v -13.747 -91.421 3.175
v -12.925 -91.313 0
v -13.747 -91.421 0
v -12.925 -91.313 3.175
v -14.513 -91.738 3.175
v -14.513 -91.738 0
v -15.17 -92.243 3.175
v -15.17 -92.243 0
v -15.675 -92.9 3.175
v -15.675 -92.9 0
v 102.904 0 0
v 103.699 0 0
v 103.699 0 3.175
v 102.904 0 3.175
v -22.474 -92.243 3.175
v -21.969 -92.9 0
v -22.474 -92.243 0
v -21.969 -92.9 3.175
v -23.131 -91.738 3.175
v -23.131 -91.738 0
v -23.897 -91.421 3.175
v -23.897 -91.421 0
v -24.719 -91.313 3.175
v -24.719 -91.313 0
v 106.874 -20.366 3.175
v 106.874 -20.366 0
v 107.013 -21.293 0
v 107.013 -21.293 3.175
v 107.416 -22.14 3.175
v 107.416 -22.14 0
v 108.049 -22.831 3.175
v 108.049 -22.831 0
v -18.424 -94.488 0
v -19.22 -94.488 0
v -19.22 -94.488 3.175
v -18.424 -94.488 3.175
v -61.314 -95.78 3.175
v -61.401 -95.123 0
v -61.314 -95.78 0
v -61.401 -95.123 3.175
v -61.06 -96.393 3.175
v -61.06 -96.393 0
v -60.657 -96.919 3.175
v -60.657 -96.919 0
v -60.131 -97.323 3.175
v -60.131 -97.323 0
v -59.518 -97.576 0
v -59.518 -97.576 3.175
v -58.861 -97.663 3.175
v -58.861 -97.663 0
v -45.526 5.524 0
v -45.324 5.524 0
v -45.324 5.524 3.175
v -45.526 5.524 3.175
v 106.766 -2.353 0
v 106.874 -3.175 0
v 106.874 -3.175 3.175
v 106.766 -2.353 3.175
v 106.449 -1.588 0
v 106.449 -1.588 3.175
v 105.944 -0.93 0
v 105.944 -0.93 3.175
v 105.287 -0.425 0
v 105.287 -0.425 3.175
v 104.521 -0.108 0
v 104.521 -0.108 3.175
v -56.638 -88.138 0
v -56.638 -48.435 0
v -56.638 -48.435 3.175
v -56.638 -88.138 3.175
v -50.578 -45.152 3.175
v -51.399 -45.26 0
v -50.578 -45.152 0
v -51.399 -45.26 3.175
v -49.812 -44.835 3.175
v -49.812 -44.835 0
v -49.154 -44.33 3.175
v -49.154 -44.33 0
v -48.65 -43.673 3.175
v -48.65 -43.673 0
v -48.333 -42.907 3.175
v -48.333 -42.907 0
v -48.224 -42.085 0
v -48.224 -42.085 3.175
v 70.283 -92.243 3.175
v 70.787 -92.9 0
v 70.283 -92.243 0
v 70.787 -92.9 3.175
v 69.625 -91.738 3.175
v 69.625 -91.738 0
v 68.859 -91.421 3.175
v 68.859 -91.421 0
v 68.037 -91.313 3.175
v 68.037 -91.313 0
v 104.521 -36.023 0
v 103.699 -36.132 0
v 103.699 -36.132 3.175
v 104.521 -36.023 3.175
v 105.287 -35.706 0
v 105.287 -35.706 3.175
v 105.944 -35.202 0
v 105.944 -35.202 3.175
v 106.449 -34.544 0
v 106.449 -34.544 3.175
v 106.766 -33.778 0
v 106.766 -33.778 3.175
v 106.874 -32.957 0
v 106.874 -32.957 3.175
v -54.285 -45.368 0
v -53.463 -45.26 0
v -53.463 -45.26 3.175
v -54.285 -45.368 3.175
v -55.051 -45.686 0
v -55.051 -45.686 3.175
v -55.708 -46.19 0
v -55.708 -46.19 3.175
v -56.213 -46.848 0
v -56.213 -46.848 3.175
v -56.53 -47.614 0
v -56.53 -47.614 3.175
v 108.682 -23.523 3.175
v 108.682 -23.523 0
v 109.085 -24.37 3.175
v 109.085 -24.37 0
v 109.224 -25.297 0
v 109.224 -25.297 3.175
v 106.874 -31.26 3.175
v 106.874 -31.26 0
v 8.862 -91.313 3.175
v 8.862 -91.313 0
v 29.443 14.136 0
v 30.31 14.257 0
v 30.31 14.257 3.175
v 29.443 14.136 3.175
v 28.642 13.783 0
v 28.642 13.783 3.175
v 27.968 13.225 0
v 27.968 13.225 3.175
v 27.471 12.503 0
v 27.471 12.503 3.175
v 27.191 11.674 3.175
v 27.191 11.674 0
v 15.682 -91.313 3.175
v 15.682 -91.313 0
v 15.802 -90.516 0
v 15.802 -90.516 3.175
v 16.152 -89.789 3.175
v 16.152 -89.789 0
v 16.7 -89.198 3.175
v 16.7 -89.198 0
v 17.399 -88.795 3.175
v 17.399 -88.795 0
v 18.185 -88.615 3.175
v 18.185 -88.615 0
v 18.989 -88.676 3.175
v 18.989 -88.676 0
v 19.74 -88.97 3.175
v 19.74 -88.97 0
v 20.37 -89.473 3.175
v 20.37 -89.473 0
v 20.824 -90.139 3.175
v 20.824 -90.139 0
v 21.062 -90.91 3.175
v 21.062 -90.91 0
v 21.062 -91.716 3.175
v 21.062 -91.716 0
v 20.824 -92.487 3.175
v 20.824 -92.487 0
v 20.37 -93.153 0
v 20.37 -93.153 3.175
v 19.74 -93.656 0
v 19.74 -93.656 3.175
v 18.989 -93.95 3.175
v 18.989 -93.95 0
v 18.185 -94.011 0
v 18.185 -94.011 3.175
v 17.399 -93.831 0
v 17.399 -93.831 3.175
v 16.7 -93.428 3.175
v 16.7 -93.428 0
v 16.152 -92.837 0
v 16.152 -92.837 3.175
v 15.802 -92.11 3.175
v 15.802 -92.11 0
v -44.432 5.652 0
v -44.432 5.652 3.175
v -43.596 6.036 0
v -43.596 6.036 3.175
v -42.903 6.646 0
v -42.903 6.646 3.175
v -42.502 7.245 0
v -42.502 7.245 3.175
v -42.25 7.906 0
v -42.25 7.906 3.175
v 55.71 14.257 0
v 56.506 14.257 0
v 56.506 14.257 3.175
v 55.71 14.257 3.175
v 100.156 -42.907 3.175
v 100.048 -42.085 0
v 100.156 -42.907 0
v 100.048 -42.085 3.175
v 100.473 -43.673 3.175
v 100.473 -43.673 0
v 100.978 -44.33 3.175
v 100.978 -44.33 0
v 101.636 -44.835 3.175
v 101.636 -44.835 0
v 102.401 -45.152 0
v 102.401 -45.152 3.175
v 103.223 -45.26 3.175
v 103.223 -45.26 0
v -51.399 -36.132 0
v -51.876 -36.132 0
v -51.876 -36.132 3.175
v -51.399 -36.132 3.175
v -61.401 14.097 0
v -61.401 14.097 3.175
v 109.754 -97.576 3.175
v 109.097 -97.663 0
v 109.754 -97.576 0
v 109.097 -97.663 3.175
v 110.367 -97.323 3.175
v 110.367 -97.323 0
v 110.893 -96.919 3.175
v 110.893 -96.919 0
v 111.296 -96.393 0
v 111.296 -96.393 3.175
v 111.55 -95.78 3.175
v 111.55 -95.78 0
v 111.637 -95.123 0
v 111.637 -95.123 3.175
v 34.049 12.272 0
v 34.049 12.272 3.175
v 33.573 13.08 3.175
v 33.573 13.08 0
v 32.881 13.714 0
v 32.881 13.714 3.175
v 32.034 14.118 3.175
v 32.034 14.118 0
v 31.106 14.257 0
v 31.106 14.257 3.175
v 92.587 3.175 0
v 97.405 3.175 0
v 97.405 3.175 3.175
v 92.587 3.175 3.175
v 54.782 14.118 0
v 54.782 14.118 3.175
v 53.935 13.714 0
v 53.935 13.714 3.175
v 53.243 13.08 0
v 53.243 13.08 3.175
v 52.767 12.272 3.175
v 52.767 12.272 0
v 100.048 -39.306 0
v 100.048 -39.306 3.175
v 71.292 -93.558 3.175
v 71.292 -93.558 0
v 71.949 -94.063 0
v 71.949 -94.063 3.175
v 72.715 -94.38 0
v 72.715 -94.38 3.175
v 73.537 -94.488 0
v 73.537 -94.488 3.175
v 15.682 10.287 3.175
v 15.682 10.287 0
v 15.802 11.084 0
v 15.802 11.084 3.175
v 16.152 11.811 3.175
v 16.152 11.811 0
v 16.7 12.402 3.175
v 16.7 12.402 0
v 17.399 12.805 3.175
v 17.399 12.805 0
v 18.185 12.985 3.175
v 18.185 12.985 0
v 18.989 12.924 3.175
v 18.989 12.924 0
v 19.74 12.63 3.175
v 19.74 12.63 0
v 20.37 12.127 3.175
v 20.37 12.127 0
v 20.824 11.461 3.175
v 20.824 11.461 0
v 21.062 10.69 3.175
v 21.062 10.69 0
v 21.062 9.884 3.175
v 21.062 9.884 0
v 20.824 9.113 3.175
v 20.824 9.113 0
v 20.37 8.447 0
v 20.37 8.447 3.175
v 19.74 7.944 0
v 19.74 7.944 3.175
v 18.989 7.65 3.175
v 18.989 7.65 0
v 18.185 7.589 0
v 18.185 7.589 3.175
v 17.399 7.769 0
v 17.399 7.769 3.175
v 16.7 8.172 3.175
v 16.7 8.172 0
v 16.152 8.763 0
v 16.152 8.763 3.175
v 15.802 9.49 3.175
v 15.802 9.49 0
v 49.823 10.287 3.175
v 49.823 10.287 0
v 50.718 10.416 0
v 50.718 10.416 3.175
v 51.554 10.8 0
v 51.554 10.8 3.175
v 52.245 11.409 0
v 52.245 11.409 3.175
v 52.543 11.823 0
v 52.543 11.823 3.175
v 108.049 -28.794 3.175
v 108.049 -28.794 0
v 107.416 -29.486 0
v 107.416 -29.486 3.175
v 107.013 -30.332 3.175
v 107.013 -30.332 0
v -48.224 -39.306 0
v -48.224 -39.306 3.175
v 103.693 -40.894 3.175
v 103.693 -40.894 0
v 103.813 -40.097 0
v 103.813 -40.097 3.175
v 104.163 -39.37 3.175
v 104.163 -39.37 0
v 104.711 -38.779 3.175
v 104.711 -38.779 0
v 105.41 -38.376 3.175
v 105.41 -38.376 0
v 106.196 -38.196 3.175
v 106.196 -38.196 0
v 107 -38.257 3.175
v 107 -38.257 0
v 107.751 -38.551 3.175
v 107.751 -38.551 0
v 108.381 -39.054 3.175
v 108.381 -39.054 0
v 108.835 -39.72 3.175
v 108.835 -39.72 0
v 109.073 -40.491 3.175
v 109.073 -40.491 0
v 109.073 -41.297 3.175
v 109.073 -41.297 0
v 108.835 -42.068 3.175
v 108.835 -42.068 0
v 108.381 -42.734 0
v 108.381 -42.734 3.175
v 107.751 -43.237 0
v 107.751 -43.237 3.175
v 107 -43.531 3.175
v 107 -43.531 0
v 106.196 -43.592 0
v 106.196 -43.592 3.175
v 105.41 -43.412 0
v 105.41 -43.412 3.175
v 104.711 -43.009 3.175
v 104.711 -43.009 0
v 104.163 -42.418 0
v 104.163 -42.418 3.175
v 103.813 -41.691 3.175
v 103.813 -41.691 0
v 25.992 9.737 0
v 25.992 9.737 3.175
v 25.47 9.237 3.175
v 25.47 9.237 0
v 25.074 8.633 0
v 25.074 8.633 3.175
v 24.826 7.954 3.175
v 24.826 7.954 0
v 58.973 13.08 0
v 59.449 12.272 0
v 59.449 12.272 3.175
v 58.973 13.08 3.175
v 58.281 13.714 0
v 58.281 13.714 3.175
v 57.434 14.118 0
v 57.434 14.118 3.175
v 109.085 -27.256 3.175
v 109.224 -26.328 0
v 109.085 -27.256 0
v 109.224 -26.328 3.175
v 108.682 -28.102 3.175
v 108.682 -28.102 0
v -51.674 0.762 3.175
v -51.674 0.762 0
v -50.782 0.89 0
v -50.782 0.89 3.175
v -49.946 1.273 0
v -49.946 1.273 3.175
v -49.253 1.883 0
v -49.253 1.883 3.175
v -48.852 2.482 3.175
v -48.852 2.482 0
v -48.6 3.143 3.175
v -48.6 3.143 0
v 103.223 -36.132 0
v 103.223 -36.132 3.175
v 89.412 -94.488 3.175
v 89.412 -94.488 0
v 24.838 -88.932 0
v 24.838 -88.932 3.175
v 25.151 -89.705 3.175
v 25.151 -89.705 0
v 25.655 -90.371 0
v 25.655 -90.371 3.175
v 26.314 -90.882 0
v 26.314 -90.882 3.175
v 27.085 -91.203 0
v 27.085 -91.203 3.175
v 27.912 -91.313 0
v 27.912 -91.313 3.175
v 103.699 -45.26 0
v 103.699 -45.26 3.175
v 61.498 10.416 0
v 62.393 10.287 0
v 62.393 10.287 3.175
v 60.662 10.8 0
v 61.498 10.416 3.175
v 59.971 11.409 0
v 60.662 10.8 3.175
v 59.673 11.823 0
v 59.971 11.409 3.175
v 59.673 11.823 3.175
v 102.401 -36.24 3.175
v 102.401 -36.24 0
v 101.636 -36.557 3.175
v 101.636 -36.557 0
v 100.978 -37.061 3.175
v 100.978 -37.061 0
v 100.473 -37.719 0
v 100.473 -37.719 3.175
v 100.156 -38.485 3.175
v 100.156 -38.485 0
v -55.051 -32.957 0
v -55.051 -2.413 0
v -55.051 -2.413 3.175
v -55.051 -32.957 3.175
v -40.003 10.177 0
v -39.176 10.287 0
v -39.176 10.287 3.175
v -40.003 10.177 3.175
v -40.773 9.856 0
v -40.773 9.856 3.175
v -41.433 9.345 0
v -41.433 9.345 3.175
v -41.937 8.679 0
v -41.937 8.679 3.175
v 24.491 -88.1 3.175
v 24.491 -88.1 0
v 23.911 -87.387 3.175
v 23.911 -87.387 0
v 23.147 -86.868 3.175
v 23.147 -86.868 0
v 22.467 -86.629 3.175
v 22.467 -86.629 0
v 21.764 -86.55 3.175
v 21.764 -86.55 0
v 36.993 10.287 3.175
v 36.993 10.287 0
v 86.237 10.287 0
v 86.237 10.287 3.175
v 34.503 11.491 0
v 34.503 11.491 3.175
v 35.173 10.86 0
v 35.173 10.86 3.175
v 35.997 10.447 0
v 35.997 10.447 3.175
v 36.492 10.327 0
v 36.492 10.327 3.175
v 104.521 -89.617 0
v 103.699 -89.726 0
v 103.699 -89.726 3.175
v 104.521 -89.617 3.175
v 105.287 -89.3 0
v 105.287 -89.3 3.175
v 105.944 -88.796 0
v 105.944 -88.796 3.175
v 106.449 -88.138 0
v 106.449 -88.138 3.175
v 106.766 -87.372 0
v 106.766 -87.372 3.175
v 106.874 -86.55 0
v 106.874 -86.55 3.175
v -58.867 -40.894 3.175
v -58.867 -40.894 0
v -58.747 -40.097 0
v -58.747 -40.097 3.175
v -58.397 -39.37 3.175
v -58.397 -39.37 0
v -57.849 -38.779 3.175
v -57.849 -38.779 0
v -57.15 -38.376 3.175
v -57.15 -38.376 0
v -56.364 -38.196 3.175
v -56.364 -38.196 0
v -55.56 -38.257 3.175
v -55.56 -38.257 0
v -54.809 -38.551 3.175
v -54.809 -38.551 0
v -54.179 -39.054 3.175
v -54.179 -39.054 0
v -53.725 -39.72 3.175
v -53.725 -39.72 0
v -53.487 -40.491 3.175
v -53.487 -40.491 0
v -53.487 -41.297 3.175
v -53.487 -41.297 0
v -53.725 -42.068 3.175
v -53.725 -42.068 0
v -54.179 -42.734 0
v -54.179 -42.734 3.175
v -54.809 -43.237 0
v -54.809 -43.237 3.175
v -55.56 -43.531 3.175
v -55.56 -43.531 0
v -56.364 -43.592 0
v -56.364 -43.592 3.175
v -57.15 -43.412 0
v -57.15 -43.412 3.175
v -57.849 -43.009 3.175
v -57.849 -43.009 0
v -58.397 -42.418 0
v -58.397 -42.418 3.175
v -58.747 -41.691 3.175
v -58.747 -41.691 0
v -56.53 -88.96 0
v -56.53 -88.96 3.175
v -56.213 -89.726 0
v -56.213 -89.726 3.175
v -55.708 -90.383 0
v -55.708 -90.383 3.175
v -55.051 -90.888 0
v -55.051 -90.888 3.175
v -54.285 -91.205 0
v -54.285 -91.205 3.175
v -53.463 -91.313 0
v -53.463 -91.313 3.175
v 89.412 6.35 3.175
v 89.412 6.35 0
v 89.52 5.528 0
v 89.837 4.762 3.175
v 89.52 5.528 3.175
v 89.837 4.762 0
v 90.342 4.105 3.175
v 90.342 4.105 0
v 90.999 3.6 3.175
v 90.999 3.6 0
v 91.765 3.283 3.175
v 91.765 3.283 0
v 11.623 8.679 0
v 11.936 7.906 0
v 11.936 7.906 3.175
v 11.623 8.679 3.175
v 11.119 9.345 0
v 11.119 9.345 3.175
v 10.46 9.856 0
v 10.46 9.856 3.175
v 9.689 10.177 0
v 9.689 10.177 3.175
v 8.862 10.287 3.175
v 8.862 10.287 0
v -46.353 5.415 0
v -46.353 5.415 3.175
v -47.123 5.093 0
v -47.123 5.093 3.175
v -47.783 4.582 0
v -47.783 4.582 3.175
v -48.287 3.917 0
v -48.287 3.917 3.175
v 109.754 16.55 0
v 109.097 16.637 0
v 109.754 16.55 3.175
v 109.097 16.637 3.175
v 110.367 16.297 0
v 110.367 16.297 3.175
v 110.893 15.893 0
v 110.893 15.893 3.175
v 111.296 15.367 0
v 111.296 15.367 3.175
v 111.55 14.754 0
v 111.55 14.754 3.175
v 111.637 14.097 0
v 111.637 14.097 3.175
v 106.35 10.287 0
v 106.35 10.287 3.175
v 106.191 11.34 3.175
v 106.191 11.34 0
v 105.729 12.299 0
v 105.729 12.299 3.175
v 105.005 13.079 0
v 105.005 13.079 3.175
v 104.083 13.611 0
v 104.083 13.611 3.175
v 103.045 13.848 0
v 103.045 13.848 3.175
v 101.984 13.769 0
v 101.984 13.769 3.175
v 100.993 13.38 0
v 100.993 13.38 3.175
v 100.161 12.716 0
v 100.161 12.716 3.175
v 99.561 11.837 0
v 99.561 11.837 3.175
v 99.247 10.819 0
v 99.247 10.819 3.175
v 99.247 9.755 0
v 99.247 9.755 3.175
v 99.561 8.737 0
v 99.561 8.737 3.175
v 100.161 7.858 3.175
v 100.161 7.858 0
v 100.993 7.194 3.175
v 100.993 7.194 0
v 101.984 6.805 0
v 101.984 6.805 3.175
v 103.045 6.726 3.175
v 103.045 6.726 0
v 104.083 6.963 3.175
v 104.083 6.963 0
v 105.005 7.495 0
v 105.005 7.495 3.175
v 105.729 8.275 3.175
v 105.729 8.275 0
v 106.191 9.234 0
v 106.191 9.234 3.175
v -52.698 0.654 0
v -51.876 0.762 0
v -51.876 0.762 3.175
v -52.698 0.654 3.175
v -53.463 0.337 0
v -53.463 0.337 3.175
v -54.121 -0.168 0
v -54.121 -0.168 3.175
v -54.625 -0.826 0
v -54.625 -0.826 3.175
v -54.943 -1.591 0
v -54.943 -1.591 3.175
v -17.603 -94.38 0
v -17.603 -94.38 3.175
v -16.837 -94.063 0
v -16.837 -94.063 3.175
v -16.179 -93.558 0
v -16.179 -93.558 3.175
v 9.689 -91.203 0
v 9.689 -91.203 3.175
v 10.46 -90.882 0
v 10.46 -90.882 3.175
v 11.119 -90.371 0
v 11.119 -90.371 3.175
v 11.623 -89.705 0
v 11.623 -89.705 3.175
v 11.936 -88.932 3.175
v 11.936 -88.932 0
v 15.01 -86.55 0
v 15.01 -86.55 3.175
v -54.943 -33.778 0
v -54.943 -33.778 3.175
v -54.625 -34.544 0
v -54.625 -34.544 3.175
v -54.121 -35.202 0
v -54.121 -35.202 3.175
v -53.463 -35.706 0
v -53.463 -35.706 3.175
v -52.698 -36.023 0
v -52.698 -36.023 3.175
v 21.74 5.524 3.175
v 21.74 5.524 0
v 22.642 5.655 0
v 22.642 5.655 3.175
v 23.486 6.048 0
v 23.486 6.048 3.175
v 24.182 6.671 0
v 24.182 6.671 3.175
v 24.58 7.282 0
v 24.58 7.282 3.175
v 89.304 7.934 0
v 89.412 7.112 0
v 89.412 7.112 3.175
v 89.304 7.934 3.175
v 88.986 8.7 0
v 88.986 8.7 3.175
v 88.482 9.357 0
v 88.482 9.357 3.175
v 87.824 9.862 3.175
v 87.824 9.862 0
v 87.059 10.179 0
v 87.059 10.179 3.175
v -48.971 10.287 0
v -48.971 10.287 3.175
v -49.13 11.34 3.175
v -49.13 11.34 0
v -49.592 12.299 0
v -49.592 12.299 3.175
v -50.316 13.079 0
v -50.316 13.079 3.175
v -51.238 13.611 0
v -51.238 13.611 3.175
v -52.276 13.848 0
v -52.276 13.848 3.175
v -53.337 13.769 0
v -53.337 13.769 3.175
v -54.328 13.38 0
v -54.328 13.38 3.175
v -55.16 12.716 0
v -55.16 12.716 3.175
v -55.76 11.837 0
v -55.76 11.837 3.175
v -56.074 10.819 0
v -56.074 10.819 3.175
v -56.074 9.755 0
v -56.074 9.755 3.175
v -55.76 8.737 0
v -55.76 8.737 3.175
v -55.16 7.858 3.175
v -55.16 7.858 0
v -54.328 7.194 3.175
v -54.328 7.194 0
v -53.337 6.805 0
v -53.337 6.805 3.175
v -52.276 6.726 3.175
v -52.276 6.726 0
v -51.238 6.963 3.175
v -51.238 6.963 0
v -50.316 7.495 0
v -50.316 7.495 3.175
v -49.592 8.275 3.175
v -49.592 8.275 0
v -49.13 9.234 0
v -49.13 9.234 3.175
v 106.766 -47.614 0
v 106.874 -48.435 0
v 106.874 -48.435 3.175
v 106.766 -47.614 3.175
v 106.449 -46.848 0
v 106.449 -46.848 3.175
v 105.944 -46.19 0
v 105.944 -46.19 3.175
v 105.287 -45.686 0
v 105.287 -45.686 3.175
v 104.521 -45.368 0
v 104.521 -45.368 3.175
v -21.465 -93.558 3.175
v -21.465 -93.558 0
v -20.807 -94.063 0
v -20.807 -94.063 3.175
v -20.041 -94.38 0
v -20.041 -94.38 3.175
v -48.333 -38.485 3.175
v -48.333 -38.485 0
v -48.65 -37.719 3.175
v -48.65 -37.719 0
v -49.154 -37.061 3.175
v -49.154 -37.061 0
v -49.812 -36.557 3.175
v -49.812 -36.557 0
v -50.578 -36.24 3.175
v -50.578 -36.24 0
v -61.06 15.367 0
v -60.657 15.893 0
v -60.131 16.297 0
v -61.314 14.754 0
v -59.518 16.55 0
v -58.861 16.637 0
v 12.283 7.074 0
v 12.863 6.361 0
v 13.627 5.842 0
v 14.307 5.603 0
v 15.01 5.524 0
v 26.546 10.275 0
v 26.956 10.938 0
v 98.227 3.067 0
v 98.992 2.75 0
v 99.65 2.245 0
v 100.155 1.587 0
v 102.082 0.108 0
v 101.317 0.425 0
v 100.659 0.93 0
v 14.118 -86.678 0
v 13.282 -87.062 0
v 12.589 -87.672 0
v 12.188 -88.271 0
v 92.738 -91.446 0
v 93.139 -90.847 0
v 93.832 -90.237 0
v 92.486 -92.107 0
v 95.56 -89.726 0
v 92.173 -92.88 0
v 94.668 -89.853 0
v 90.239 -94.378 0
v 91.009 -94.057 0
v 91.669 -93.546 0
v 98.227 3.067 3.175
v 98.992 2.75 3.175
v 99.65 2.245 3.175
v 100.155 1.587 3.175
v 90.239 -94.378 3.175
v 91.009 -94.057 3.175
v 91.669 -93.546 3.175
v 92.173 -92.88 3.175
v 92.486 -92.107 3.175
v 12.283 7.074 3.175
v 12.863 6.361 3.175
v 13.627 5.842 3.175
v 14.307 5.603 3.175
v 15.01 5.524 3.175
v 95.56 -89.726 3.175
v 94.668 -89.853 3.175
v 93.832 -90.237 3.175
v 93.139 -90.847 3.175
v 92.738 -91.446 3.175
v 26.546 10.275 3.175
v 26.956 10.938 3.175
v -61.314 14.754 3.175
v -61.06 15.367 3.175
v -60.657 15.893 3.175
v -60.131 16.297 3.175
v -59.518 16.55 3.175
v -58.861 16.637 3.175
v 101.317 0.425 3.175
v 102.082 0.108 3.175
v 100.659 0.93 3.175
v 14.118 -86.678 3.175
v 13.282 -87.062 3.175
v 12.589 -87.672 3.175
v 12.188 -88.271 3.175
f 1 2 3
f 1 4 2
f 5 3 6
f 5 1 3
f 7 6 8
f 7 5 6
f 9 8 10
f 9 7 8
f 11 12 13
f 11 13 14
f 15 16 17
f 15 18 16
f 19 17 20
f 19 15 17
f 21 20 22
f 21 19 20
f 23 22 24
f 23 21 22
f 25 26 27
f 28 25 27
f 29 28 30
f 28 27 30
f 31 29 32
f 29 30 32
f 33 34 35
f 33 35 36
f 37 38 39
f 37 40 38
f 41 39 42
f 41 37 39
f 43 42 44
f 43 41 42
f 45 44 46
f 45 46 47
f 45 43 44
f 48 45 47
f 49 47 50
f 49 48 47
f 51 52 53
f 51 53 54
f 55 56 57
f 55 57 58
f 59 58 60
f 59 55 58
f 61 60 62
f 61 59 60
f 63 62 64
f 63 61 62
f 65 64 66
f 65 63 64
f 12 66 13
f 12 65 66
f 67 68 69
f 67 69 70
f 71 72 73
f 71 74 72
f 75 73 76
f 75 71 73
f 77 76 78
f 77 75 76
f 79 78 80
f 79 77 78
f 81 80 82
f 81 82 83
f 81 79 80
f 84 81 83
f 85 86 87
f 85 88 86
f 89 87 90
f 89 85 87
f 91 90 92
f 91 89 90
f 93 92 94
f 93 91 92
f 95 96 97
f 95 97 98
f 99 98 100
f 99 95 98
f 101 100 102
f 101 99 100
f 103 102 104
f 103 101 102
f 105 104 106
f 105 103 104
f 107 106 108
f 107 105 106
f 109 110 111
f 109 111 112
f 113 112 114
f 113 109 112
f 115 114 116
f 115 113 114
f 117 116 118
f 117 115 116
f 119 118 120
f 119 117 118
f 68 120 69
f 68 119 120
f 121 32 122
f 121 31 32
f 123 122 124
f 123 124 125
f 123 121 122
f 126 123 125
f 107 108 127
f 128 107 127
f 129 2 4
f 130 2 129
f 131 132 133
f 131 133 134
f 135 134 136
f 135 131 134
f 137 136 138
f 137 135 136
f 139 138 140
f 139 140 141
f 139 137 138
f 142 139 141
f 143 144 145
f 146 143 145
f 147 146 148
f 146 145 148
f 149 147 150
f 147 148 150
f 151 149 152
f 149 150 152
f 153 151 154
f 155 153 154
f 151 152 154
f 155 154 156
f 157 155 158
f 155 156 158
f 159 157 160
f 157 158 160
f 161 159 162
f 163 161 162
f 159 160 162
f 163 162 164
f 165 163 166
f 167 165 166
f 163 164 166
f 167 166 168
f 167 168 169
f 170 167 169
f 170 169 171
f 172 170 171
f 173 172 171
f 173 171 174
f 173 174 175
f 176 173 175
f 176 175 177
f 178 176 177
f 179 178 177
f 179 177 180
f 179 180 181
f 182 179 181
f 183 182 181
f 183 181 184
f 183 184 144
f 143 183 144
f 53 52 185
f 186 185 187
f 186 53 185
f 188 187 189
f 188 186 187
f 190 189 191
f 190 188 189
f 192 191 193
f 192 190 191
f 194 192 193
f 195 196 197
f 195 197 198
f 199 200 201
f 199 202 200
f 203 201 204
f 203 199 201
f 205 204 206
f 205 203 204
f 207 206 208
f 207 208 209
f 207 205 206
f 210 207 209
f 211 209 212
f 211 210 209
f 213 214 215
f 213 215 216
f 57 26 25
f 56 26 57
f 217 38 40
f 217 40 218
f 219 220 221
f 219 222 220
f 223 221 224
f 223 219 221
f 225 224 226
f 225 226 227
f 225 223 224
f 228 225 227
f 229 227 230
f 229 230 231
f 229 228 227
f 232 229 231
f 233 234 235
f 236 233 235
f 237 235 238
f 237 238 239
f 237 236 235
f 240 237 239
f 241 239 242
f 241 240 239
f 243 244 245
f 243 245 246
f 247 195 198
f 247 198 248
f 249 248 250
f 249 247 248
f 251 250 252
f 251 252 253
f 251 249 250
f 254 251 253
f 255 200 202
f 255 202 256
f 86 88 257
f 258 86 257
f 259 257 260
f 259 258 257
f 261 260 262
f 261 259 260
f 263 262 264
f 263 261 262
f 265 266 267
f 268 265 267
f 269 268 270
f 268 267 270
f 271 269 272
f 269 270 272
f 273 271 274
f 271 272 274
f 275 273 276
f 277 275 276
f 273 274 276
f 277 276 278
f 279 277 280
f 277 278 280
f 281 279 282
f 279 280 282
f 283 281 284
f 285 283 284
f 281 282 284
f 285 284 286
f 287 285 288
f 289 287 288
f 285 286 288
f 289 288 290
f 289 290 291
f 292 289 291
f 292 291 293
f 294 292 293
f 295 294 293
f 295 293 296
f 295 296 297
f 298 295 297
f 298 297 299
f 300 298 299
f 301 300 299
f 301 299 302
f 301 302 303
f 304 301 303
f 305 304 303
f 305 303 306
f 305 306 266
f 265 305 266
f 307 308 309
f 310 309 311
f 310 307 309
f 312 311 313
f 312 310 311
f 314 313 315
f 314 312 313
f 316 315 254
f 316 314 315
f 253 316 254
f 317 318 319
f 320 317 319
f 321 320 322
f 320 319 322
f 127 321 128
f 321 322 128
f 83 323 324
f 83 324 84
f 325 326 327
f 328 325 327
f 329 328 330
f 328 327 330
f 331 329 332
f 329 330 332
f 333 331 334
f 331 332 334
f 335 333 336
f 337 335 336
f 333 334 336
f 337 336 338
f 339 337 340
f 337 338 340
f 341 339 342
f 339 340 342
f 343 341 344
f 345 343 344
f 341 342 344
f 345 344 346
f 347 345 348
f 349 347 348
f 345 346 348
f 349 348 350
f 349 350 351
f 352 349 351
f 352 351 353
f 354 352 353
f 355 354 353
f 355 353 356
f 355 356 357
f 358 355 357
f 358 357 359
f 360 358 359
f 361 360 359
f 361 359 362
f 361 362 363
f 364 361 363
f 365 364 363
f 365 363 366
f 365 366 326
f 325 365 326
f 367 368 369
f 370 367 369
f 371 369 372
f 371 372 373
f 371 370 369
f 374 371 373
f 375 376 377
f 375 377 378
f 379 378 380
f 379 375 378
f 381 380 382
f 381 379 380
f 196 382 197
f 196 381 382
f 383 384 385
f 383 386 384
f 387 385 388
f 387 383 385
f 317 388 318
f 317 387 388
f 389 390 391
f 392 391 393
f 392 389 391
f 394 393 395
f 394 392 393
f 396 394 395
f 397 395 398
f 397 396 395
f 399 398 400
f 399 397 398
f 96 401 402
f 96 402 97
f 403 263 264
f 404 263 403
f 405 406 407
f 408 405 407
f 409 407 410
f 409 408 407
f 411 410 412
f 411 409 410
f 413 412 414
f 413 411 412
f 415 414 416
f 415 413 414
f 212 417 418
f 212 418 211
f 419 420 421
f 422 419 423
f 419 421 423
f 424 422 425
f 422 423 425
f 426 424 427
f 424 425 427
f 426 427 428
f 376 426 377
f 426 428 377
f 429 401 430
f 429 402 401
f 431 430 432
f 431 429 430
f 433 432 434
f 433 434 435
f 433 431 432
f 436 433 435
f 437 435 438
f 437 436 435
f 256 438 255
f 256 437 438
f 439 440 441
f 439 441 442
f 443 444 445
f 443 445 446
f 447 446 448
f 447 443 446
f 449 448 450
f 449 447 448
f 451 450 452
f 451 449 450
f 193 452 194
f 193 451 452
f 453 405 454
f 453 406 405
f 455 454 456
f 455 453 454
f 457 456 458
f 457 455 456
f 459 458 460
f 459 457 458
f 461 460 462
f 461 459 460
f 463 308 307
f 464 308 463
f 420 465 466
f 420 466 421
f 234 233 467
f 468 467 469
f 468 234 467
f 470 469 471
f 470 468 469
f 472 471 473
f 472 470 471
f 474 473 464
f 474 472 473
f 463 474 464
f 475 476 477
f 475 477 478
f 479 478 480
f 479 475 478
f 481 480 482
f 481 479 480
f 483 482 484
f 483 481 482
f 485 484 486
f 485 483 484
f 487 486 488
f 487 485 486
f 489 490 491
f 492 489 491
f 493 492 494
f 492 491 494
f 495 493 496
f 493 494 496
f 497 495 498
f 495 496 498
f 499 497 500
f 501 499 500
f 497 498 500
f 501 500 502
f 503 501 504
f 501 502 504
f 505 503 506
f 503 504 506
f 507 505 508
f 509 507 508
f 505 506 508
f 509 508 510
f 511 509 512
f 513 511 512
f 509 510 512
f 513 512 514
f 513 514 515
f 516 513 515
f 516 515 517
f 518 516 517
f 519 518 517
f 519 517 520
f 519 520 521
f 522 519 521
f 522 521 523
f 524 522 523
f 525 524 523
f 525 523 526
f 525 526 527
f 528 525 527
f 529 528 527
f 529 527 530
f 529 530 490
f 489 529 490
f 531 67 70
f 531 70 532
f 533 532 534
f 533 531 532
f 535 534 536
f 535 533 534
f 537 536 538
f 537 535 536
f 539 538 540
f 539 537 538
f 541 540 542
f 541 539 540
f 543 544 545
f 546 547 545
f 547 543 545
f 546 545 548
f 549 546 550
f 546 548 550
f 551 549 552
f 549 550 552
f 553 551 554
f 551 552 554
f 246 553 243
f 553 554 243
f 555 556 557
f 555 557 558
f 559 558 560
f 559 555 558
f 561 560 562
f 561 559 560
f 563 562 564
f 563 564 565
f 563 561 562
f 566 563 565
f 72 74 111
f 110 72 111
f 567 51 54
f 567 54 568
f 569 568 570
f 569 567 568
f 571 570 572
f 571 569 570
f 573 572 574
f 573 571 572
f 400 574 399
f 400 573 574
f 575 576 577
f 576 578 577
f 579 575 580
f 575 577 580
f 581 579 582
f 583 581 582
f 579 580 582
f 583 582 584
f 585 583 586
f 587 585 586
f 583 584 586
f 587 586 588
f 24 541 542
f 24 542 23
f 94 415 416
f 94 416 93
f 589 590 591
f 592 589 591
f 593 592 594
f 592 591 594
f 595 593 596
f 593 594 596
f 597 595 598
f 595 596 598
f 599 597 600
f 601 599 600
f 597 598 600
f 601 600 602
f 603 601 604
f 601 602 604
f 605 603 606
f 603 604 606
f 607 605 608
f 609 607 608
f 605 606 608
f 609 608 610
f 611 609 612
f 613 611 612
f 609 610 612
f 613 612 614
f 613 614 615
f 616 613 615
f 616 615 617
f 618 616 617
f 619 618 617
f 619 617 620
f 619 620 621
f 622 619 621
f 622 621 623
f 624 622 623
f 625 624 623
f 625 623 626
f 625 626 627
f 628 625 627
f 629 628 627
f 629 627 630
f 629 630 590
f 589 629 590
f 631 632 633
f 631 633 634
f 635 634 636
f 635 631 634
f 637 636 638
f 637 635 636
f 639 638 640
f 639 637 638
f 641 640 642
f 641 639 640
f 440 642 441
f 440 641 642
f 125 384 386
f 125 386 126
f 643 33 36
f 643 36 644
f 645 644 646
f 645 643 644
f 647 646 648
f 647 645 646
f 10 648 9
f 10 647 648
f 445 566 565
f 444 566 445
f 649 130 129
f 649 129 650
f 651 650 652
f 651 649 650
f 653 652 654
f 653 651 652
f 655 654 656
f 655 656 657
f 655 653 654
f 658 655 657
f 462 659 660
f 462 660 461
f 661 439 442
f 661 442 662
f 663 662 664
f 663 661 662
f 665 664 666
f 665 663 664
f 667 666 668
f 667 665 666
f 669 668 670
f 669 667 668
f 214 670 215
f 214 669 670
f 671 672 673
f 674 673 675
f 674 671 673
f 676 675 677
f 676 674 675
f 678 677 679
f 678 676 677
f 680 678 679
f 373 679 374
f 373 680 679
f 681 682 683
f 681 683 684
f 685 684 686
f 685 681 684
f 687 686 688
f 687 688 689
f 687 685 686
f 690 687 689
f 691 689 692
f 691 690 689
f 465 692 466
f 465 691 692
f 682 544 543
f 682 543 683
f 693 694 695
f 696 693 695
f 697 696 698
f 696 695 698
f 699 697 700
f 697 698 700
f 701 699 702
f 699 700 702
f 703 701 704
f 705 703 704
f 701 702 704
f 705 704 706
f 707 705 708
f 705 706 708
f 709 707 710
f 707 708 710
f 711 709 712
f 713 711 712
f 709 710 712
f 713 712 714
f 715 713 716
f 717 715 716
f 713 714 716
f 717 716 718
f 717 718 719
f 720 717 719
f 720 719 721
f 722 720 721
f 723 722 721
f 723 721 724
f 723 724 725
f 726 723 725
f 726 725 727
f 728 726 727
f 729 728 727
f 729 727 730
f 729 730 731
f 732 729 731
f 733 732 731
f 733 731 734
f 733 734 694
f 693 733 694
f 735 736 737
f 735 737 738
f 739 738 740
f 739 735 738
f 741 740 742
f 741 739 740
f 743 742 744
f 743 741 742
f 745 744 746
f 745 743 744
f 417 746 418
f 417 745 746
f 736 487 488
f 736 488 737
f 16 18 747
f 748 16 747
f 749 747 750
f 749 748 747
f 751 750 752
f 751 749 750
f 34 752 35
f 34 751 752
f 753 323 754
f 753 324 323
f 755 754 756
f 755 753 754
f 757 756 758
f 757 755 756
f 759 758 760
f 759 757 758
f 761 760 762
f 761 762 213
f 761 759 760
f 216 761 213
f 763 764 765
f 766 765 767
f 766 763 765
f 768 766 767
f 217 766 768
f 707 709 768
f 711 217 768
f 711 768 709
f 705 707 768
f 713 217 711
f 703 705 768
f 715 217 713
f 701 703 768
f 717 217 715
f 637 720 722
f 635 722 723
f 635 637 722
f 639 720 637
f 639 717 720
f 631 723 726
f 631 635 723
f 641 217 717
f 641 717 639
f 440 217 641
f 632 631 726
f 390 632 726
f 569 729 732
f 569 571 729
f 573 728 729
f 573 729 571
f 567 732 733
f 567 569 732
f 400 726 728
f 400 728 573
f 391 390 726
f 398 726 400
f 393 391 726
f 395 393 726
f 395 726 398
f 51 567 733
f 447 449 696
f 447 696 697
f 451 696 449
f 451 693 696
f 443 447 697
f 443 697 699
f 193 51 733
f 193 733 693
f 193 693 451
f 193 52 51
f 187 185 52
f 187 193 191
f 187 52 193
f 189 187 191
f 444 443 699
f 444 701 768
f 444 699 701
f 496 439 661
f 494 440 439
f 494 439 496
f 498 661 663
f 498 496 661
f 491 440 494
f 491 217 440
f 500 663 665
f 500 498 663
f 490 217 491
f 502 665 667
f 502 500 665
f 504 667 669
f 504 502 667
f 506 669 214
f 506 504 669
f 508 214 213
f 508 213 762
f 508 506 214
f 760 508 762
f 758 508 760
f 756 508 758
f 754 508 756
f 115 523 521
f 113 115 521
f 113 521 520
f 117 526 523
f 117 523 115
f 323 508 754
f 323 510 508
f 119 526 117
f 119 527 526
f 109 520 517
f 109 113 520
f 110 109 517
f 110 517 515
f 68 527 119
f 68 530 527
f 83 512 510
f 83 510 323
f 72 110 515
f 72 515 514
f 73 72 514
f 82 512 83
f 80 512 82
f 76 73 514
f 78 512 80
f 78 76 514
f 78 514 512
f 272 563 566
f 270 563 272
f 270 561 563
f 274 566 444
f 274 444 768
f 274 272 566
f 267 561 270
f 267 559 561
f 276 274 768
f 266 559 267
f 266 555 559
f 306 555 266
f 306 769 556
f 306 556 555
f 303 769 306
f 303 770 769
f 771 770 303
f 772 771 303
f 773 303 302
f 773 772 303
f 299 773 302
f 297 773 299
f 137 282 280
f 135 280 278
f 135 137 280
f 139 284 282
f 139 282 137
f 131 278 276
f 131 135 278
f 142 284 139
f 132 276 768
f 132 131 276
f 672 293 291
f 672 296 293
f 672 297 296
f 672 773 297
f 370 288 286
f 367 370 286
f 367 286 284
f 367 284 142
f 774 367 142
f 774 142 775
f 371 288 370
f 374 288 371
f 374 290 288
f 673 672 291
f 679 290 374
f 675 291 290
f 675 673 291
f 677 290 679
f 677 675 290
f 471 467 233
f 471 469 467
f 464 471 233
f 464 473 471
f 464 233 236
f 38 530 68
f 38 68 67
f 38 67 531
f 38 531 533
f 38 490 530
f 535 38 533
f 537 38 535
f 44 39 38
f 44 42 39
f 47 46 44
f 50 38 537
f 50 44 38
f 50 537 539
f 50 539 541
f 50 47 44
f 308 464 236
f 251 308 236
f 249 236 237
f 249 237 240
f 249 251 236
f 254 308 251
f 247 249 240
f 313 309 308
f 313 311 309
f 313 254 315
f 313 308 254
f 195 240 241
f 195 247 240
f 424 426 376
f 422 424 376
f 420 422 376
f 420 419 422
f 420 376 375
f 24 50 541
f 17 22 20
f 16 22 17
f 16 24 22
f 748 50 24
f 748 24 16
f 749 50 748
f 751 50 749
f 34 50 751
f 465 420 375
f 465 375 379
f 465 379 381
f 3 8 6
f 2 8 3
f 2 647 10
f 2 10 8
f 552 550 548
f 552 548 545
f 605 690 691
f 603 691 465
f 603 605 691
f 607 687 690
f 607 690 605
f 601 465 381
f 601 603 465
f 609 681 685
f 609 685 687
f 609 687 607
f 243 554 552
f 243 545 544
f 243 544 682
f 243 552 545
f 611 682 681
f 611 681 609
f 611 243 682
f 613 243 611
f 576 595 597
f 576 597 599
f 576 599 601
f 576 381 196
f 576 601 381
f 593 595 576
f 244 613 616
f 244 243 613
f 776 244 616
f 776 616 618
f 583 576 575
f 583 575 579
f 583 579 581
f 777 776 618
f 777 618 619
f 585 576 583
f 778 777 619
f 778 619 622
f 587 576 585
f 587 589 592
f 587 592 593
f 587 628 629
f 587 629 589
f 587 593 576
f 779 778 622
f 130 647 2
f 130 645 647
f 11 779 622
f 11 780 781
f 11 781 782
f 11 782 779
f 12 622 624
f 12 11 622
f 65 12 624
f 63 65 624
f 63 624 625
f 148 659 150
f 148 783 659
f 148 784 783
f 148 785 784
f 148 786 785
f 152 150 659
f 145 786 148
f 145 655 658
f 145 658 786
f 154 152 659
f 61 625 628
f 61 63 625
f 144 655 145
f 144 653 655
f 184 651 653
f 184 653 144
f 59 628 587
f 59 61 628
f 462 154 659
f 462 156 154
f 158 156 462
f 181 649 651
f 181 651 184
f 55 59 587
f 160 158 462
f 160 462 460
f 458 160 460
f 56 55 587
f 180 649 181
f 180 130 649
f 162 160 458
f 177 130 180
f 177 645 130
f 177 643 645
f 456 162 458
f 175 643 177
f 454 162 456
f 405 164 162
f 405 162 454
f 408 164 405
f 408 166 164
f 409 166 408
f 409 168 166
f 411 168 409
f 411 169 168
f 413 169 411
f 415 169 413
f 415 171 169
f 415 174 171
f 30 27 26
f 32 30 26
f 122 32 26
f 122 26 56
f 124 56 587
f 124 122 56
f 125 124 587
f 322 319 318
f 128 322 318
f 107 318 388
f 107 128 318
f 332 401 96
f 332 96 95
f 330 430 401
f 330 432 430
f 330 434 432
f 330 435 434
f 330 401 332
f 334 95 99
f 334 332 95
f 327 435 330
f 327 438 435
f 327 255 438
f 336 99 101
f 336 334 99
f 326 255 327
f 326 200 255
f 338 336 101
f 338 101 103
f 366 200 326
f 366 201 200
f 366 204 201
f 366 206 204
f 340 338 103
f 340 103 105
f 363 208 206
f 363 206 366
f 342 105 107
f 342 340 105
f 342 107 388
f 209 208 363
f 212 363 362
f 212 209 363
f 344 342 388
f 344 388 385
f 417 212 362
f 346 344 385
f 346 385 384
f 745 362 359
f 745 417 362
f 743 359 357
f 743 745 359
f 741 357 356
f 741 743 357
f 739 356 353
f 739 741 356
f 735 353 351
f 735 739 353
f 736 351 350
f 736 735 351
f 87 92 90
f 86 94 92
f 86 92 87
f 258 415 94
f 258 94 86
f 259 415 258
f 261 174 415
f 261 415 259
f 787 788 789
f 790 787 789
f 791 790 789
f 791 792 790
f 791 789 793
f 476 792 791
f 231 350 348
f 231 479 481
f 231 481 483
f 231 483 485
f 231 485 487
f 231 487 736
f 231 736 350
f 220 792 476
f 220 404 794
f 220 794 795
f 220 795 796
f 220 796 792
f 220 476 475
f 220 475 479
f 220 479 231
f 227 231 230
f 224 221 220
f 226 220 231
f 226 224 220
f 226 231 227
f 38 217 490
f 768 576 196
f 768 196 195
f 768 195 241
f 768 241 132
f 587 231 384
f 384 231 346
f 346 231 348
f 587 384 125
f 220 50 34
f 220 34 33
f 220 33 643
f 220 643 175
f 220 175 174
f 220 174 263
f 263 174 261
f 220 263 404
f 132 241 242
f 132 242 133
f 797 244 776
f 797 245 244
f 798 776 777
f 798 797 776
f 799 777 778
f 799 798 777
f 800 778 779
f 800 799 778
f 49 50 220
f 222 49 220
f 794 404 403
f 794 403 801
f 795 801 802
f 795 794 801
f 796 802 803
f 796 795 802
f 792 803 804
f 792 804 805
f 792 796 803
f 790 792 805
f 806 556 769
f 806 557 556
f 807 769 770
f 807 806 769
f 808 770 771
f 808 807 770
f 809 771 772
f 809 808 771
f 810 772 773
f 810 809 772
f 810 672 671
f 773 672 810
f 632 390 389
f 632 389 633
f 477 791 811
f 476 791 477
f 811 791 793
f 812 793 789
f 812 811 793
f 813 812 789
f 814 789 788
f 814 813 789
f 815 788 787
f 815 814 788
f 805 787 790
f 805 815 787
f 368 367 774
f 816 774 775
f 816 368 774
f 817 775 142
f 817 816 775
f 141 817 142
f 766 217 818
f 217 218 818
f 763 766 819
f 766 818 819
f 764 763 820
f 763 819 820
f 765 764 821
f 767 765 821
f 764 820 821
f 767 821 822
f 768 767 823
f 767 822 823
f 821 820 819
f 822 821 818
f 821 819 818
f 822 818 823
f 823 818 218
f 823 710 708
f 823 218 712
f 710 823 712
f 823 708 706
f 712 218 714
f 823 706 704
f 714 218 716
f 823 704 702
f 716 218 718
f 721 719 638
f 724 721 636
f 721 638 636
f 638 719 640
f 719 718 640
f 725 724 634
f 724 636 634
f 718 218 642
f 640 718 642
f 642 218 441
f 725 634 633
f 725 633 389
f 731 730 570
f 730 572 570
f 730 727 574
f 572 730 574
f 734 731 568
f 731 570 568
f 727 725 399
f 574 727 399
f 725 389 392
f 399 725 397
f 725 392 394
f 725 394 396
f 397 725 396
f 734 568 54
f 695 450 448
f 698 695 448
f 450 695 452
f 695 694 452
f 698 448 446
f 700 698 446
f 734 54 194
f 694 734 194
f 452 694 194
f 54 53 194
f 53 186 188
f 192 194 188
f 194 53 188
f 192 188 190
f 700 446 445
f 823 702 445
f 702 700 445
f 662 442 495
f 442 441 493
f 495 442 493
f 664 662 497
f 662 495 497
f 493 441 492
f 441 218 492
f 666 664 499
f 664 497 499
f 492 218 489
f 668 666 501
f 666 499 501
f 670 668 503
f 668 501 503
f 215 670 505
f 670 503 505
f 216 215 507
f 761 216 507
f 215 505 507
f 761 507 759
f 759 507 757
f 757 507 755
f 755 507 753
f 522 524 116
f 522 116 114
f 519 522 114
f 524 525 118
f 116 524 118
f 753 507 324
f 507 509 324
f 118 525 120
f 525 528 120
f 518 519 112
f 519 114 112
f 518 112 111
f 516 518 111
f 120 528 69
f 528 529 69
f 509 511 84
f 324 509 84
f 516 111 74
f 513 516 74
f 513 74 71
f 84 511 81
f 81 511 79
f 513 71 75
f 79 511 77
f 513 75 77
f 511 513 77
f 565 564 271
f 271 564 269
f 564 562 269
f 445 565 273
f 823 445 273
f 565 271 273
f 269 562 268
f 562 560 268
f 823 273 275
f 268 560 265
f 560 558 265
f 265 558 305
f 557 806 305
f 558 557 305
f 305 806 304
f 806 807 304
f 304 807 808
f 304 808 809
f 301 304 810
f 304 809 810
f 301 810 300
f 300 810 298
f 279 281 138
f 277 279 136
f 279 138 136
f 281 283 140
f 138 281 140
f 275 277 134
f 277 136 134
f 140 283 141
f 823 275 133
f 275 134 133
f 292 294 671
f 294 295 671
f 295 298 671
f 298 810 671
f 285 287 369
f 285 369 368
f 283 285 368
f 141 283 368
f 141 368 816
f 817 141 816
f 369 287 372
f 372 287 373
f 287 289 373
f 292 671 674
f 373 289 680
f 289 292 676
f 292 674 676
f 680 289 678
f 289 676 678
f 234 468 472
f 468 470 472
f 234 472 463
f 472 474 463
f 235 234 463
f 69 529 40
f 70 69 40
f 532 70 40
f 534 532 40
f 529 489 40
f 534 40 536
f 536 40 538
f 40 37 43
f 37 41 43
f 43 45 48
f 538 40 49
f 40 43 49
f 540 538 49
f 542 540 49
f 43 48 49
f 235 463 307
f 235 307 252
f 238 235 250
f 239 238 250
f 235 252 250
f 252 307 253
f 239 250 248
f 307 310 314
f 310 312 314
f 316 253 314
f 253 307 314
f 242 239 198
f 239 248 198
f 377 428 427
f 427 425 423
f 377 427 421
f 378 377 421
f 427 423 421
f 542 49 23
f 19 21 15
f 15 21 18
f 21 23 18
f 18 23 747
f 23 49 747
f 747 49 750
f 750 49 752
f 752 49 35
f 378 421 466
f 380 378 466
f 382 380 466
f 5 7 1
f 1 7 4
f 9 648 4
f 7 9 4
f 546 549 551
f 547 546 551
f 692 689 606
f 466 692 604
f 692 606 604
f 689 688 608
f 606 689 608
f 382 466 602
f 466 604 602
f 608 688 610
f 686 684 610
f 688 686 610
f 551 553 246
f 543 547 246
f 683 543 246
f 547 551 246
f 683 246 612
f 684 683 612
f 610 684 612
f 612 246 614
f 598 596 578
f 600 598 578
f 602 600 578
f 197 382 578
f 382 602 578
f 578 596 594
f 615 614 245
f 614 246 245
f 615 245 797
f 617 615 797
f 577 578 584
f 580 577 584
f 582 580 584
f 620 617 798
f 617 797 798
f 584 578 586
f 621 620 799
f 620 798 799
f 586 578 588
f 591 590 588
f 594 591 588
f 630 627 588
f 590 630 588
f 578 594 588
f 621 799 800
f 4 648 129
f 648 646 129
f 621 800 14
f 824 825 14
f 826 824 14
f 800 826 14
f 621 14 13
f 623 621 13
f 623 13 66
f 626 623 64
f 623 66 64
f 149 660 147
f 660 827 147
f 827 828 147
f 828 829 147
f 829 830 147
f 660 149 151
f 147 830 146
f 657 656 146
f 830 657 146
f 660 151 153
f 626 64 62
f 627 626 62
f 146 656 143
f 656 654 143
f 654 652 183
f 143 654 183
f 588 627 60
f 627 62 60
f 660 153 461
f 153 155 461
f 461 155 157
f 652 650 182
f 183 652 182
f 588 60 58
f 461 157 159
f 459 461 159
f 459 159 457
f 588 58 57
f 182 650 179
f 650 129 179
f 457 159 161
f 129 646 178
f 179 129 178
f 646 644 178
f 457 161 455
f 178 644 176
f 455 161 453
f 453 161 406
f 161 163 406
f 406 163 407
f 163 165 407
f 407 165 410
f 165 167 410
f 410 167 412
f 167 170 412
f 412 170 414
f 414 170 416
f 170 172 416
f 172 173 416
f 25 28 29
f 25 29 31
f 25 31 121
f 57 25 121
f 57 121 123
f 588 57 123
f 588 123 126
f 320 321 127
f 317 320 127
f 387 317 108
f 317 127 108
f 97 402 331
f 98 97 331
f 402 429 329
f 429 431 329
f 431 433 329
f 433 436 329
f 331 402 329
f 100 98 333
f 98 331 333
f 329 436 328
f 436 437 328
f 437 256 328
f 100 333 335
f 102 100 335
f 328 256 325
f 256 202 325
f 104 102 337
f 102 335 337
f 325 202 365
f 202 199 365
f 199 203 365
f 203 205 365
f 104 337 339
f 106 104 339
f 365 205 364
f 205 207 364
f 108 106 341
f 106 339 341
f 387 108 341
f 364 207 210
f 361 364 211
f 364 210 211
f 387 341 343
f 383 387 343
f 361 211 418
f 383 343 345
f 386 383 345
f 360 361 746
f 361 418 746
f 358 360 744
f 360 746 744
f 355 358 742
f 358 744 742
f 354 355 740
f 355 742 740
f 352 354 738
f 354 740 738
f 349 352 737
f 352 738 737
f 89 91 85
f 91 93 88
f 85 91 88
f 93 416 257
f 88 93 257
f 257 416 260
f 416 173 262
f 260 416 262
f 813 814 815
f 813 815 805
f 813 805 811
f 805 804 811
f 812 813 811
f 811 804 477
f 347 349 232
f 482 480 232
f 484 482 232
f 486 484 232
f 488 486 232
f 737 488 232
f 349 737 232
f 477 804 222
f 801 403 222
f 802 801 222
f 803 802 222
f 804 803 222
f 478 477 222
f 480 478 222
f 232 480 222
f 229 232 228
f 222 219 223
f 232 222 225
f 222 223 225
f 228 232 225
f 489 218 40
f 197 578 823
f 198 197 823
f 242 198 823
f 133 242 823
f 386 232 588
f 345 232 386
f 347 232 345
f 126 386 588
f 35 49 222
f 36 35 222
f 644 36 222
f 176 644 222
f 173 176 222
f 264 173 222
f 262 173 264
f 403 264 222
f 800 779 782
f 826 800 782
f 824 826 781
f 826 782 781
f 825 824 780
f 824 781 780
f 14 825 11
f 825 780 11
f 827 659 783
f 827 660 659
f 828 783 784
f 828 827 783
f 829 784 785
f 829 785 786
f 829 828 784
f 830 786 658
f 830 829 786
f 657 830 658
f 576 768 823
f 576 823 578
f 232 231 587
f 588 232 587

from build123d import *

# Parameters (mm, degrees)
SKETCH1_W                  = 173.0375
SKETCH1_H                  = 114.3
BOSS_EXTRUDE1_DEPTH        = 3.175
SKETCH3_R                  = 3.175
SKETCH3_R_2                = 3.7703125
CUT_EXTRUDE1_DEPTH         = 149.360729792
F_6_CLEARANCE_HOLE1_D      = 4.3053
F_3_0_213_DIAMETER_HOLE1_D = 5.4102
F_1_4_CLEARANCE_HOLE1_D    = 7.14248
CUT_EXTRUDE5_REACH         = 150.361
SKETCH16_R                 = 1.190625
CUT_EXTRUDE6_DEPTH         = 149.360729792
FILLET5_R                  = 3.175
FILLET6_R                  = 3.175
FILLET7_R                  = 2.54


with BuildPart() as part:
    # Sketch1 → Boss-Extrude1 (new body)
    with BuildSketch(Plane.XY):
        with Locations((25.118, -40.513)):
            Rectangle(SKETCH1_W, SKETCH1_H)
    extrude(amount=BOSS_EXTRUDE1_DEPTH)

    # Sketch3 → Cut-Extrude1 (cut, through all)
    with BuildSketch(Plane.XY.offset(3.175)):
        with Locations((100.302, -26.543)):
            Circle(SKETCH3_R)
        with Locations((99.413, -51.6255)):
            Circle(SKETCH3_R_2)
        with Locations((-47.907, -51.6255)):
            Circle(SKETCH3_R_2)
        with Locations((-47.907, -6.5405)):
            Circle(SKETCH3_R_2)
    extrude(amount=-CUT_EXTRUDE1_DEPTH, mode=Mode.SUBTRACT)

    # #6 Clearance Hole1 (through all)
    with Locations(Plane.XY.offset(3.175)):
        with Locations((18.387, 10.287), (-56.162, -40.894), (106.398, -40.894), (18.387, -91.313)):
            Hole(F_6_CLEARANCE_HOLE1_D / 2)

    # #3 (0.213) Diameter Hole1 (through all)
    with Locations(Plane(origin=(18.387, 10.287, 3.175), x_dir=(1, 0, 0), z_dir=(0, 0, 1))):
        with Locations((0, 0), (-74.549, -51.181), (0, -101.6), (88.011, -51.181)):
            Hole(F_3_0_213_DIAMETER_HOLE1_D / 2)

    # 1/4 Clearance Hole1 (through all)
    with Locations(Plane(origin=(0, 0, 0), x_dir=(-1, 0, 0), z_dir=(0, 0, -1))):
        with Locations((-102.7785, 10.287), (52.5425, 10.287)):
            Hole(F_1_4_CLEARANCE_HOLE1_D / 2)

    # Sketch16 → Cut-Extrude5 (cut, up to next)
    with BuildSketch(Plane(origin=(0, 0, 0), x_dir=(-1, 0, 0), z_dir=(0, 0, -1)), mode=Mode.PRIVATE) as cut_extrude5_sk1:
        with Locations((-98.142490655, -57.489441166)):
            Circle(SKETCH16_R)
    cut_extrude5_tool1 = extrude(cut_extrude5_sk1.sketch, amount=-CUT_EXTRUDE5_REACH, mode=Mode.PRIVATE) & part.part
    # Sketch16 → Cut-Extrude5 (cut, up to next)
    with BuildSketch(Plane(origin=(0, 0, 0), x_dir=(-1, 0, 0), z_dir=(0, 0, -1)), mode=Mode.PRIVATE) as cut_extrude5_sk2:
        with Locations((49.177509345, -57.489441166)):
            Circle(SKETCH16_R)
    cut_extrude5_tool2 = extrude(cut_extrude5_sk2.sketch, amount=-CUT_EXTRUDE5_REACH, mode=Mode.PRIVATE) & part.part
    # Sketch16 → Cut-Extrude5 (cut, up to next)
    with BuildSketch(Plane(origin=(0, 0, 0), x_dir=(-1, 0, 0), z_dir=(0, 0, -1)), mode=Mode.PRIVATE) as cut_extrude5_sk3:
        with Locations((49.177509345, -12.404441166)):
            Circle(SKETCH16_R)
    cut_extrude5_tool3 = extrude(cut_extrude5_sk3.sketch, amount=-CUT_EXTRUDE5_REACH, mode=Mode.PRIVATE) & part.part
    add(cut_extrude5_tool1.solids().sort_by_distance((98.142491, -57.489441, 0))[0], mode=Mode.SUBTRACT)
    add(cut_extrude5_tool2.solids().sort_by_distance((-49.177509, -57.489441, 0))[0], mode=Mode.SUBTRACT)
    add(cut_extrude5_tool3.solids().sort_by_distance((-49.177509, -12.404441, 0))[0], mode=Mode.SUBTRACT)

    # Sketch17 → Cut-Extrude6 (cut, through all)
    with BuildSketch(Plane(origin=(0, 0, 0), x_dir=(-1, 0, 0), z_dir=(0, 0, -1))):
        Polygon((-89.41175, 10.287), (-59.68051, 10.287), (-59.68051, 14.25702), (-52.53549, 14.25702), (-52.53549, 10.287), (-34.28051, 10.287), (-34.28051, 14.25702), (-27.13549, 14.25702), (-27.13549, 10.287), (-24.737, 10.287), (-24.737, 5.5245), (-12.037, 5.5245), (-12.037, 10.287), (42.35075, 10.287), (42.35075, 5.5245), (48.70075, 5.5245), (48.70075, 0.762), (55.05075, 0.762), (55.05075, -36.1315), (48.2245, -36.1315), (48.2245, -45.26026), (56.63825, -45.26026), (56.63825, -91.313), (22.39451, -91.313), (22.39451, -94.488), (15.24949, -94.488), (15.24949, -91.313), (-12.037, -91.313), (-12.037, -86.5505), (-24.737, -86.5505), (-24.737, -91.313), (-70.36175, -91.313), (-70.36175, -94.488), (-92.58675, -94.488), (-92.58675, -89.7255), (-106.87425, -89.7255), (-106.87425, -45.26026), (-100.048, -45.26026), (-100.048, -36.1315), (-106.87425, -36.1315), (-106.87425, -28.194), (-109.22375, -28.194), (-109.22375, -23.4315), (-106.87425, -23.4315), (-106.87425, 0), (-99.72923, 0), (-99.72923, 3.175), (-89.41175, 3.175), align=None)
    extrude(amount=-CUT_EXTRUDE6_DEPTH, mode=Mode.SUBTRACT)

    # Fillet5
    # the kernel refuses this fillet: 3.175 mm, written as the material it adds along each edge
    with BuildSketch(Plane(origin=(106.87425, 0, 0), x_dir=(0, -1, 0), z_dir=(0, 0, 1)), Plane(origin=(106.87425, -45.26026, 0), x_dir=(0, -1, 0), z_dir=(0, 0, 1)), Plane(origin=(106.87425, -36.1315, 0), x_dir=(-1, 0, 0), z_dir=(0, 0, 1)), Plane(origin=(106.87425, -89.7255, 0), x_dir=(-1, 0, 0), z_dir=(0, 0, 1)), Plane(origin=(92.58675, -94.488, 0), x_dir=(-1, 0, 0), z_dir=(0, 0, 1)), Plane(origin=(70.36175, -94.488, 0), x_dir=(0, 1, 0), z_dir=(0, 0, 1)), Plane(origin=(24.737, -91.313, 0), x_dir=(0, 1, 0), z_dir=(0, 0, 1)), Plane(origin=(12.037, -91.313, 0), x_dir=(-1, 0, 0), z_dir=(0, 0, 1)), Plane(origin=(-15.24949, -94.488, 0), x_dir=(-1, 0, 0), z_dir=(0, 0, 1)), Plane(origin=(-22.39451, -94.488, 0), x_dir=(0, 1, 0), z_dir=(0, 0, 1)), Plane(origin=(-56.63825, -91.313, 0), x_dir=(0, 1, 0), z_dir=(0, 0, 1)), Plane(origin=(-55.05075, -36.1315, 0), x_dir=(0, 1, 0), z_dir=(0, 0, 1)), Plane(origin=(-56.63825, -45.26026, 0), x_dir=(1, 0, 0), z_dir=(0, 0, 1)), Plane(origin=(-55.05075, 0.762, 0), x_dir=(1, 0, 0), z_dir=(0, 0, 1)), Plane(origin=(-48.70075, 5.5245, 0), x_dir=(1, 0, 0), z_dir=(0, 0, 1)), Plane(origin=(-42.35075, 10.287, 0), x_dir=(1, 0, 0), z_dir=(0, 0, 1)), Plane(origin=(12.037, 10.287, 0), x_dir=(0, -1, 0), z_dir=(0, 0, 1)), Plane(origin=(34.28051, 14.25702, 0), x_dir=(0, -1, 0), z_dir=(0, 0, 1)), Plane(origin=(27.13549, 14.25702, 0), x_dir=(1, 0, 0), z_dir=(0, 0, 1)), Plane(origin=(52.53549, 14.25702, 0), x_dir=(1, 0, 0), z_dir=(0, 0, 1)), Plane(origin=(59.68051, 14.25702, 0), x_dir=(0, -1, 0), z_dir=(0, 0, 1))) as fillet5_piece_1:
        with BuildLine():
            CenterArc((FILLET5_R, -FILLET5_R), FILLET5_R, 90, 90)
            Line((0, -FILLET5_R), (-FILLET5_R * 0.02, -FILLET5_R))
            Line((-FILLET5_R * 0.02, -FILLET5_R), (-FILLET5_R * 0.02, FILLET5_R * 0.02))
            Line((-FILLET5_R * 0.02, FILLET5_R * 0.02), (FILLET5_R, FILLET5_R * 0.02))
            Line((FILLET5_R, FILLET5_R * 0.02), (FILLET5_R, 0))
        make_face()
    extrude(amount=3.175)
    with BuildSketch(Plane(origin=(24.737, 10.287, 0), x_dir=(1, 0, 0), z_dir=(0, 0, 1))) as fillet5_piece_2:
        with BuildLine():
            CenterArc((3.175, -3.07858039), FILLET5_R, 104.15642815, 75.84357185)
            Line((0, -3.07858039), (-0.0635, -3.07858039))
            Line((-0.0635, -3.07858039), (-0.0635, 0))
            Line((-0.0635, 0), (0, 0.0635))
            ThreePointArc((0, 0.0635), (1.199245, 0.0635), (2.3829598, 0.061571608))
            Line((2.3829598, 0.061571608), (2.39849, 0))
        make_face()
    extrude(amount=3.175)
    with BuildSketch(Plane(origin=(89.41175, 10.287, 0), x_dir=(-1, 0, 0), z_dir=(0, 0, 1))) as fillet5_piece_3:
        with BuildLine():
            CenterArc((FILLET5_R, FILLET5_R), FILLET5_R, 180, 90)
            Line((0, FILLET5_R), (-FILLET5_R * 0.02, FILLET5_R))
            Line((-FILLET5_R * 0.02, FILLET5_R), (-FILLET5_R * 0.02, -FILLET5_R * 0.02))
            Line((-FILLET5_R * 0.02, -FILLET5_R * 0.02), (FILLET5_R, -FILLET5_R * 0.02))
            Line((FILLET5_R, -FILLET5_R * 0.02), (FILLET5_R, 0))
        make_face()
    extrude(amount=3.175)
    # the kernel refuses this fillet: 3.175 mm, written as the material it takes off along each edge
    with BuildSketch(Plane(origin=(99.72923, 0, -7.9375), x_dir=(1, 0, 0), z_dir=(0, 0, 1)), Plane(origin=(89.41175, 3.175, -7.9375), x_dir=(1, 0, 0), z_dir=(0, 0, 1))) as fillet5_2_piece_1:
        with BuildLine():
            CenterArc((FILLET5_R, FILLET5_R), FILLET5_R, 180, 90)
            Line((0, FILLET5_R), (-FILLET5_R * 0.02, FILLET5_R))
            Line((-FILLET5_R * 0.02, FILLET5_R), (-FILLET5_R * 0.02, -FILLET5_R * 0.02))
            Line((-FILLET5_R * 0.02, -FILLET5_R * 0.02), (FILLET5_R, -FILLET5_R * 0.02))
            Line((FILLET5_R, -FILLET5_R * 0.02), (FILLET5_R, 0))
        make_face()
    extrude(amount=19.05, mode=Mode.SUBTRACT)
    with BuildSketch(Plane(origin=(106.87425, -23.4315, -7.664518392), x_dir=(1, 0, 0), z_dir=(0, 0, 1))) as fillet5_2_piece_2:
        with BuildLine():
            CenterArc((3.175, 3.065807357), FILLET5_R, 180, 74.929937855)
            Line((0, 3.065807357), (-0.0635, 3.065807357))
            Line((-0.0635, 3.065807357), (-0.0635, 0))
            Line((-0.0635, 0), (0, -0.0635))
            ThreePointArc((0, -0.0635), (1.17475, -0.0635), (2.33299, -0.061316147))
            Line((2.33299, -0.061316147), (2.3495, 0))
        make_face()
    extrude(amount=18.504036785, mode=Mode.SUBTRACT)
    with BuildSketch(Plane(origin=(106.87425, -28.194, -7.664518392), x_dir=(0, -1, 0), z_dir=(0, 0, 1))) as fillet5_2_piece_3:
        with BuildLine():
            CenterArc((3.065807357, 3.175), FILLET5_R, 195.070062145, 74.929937855)
            Line((0, 2.3495), (-0.061316147, 2.33299))
            ThreePointArc((-0.061316147, 2.33299), (-0.0635, 1.17475), (-0.0635, 0))
            Line((-0.0635, 0), (0, -0.0635))
            Line((0, -0.0635), (3.065807357, -0.0635))
            Line((3.065807357, -0.0635), (3.065807357, 0))
        make_face()
    extrude(amount=18.504036785, mode=Mode.SUBTRACT)

    # Fillet6
    fillet6_edges = [part.edges().sort_by_distance(p)[0] for p in [
        (99.72923, 3.175, 1.5875),
        (59.68051, 10.287, 1.5875),
        (52.53549, 10.287, 1.5875),
        (34.28051, 10.287, 1.5875),
        (27.13549, 10.287, 1.5875),
        (24.737, 5.5245, 1.5875),
        (12.037, 5.5245, 1.5875),
        (-42.35075, 5.5245, 1.5875),
        (-48.70075, 0.762, 1.5875),
        (-48.2245, -36.1315, 1.5875),
        (-48.2245, -45.26026, 1.5875),
        (-22.39451, -91.313, 1.5875),
        (-15.24949, -91.313, 1.5875),
        (12.037, -86.5505, 1.5875),
        (24.737, -86.5505, 1.5875),
        (70.36175, -91.313, 1.5875),
        (92.58675, -89.7255, 1.5875),
        (100.048, -45.26026, 1.5875),
        (100.048, -36.1315, 1.5875),
        (109.22375, -28.194, 1.5875),
        (109.22375, -23.4315, 1.5875),
    ]]
    fillet(fillet6_edges, radius=FILLET6_R)

    # Fillet7
    fillet7_edges = [part.edges().sort_by_distance(p)[0] for p in [
        (-61.40075, 16.637, 1.5875),
        (111.63675, 16.637, 1.5875),
        (111.63675, -97.663, 1.5875),
        (-61.40075, -97.663, 1.5875),
    ]]
    fillet(fillet7_edges, radius=FILLET7_R)


solid = part.part
